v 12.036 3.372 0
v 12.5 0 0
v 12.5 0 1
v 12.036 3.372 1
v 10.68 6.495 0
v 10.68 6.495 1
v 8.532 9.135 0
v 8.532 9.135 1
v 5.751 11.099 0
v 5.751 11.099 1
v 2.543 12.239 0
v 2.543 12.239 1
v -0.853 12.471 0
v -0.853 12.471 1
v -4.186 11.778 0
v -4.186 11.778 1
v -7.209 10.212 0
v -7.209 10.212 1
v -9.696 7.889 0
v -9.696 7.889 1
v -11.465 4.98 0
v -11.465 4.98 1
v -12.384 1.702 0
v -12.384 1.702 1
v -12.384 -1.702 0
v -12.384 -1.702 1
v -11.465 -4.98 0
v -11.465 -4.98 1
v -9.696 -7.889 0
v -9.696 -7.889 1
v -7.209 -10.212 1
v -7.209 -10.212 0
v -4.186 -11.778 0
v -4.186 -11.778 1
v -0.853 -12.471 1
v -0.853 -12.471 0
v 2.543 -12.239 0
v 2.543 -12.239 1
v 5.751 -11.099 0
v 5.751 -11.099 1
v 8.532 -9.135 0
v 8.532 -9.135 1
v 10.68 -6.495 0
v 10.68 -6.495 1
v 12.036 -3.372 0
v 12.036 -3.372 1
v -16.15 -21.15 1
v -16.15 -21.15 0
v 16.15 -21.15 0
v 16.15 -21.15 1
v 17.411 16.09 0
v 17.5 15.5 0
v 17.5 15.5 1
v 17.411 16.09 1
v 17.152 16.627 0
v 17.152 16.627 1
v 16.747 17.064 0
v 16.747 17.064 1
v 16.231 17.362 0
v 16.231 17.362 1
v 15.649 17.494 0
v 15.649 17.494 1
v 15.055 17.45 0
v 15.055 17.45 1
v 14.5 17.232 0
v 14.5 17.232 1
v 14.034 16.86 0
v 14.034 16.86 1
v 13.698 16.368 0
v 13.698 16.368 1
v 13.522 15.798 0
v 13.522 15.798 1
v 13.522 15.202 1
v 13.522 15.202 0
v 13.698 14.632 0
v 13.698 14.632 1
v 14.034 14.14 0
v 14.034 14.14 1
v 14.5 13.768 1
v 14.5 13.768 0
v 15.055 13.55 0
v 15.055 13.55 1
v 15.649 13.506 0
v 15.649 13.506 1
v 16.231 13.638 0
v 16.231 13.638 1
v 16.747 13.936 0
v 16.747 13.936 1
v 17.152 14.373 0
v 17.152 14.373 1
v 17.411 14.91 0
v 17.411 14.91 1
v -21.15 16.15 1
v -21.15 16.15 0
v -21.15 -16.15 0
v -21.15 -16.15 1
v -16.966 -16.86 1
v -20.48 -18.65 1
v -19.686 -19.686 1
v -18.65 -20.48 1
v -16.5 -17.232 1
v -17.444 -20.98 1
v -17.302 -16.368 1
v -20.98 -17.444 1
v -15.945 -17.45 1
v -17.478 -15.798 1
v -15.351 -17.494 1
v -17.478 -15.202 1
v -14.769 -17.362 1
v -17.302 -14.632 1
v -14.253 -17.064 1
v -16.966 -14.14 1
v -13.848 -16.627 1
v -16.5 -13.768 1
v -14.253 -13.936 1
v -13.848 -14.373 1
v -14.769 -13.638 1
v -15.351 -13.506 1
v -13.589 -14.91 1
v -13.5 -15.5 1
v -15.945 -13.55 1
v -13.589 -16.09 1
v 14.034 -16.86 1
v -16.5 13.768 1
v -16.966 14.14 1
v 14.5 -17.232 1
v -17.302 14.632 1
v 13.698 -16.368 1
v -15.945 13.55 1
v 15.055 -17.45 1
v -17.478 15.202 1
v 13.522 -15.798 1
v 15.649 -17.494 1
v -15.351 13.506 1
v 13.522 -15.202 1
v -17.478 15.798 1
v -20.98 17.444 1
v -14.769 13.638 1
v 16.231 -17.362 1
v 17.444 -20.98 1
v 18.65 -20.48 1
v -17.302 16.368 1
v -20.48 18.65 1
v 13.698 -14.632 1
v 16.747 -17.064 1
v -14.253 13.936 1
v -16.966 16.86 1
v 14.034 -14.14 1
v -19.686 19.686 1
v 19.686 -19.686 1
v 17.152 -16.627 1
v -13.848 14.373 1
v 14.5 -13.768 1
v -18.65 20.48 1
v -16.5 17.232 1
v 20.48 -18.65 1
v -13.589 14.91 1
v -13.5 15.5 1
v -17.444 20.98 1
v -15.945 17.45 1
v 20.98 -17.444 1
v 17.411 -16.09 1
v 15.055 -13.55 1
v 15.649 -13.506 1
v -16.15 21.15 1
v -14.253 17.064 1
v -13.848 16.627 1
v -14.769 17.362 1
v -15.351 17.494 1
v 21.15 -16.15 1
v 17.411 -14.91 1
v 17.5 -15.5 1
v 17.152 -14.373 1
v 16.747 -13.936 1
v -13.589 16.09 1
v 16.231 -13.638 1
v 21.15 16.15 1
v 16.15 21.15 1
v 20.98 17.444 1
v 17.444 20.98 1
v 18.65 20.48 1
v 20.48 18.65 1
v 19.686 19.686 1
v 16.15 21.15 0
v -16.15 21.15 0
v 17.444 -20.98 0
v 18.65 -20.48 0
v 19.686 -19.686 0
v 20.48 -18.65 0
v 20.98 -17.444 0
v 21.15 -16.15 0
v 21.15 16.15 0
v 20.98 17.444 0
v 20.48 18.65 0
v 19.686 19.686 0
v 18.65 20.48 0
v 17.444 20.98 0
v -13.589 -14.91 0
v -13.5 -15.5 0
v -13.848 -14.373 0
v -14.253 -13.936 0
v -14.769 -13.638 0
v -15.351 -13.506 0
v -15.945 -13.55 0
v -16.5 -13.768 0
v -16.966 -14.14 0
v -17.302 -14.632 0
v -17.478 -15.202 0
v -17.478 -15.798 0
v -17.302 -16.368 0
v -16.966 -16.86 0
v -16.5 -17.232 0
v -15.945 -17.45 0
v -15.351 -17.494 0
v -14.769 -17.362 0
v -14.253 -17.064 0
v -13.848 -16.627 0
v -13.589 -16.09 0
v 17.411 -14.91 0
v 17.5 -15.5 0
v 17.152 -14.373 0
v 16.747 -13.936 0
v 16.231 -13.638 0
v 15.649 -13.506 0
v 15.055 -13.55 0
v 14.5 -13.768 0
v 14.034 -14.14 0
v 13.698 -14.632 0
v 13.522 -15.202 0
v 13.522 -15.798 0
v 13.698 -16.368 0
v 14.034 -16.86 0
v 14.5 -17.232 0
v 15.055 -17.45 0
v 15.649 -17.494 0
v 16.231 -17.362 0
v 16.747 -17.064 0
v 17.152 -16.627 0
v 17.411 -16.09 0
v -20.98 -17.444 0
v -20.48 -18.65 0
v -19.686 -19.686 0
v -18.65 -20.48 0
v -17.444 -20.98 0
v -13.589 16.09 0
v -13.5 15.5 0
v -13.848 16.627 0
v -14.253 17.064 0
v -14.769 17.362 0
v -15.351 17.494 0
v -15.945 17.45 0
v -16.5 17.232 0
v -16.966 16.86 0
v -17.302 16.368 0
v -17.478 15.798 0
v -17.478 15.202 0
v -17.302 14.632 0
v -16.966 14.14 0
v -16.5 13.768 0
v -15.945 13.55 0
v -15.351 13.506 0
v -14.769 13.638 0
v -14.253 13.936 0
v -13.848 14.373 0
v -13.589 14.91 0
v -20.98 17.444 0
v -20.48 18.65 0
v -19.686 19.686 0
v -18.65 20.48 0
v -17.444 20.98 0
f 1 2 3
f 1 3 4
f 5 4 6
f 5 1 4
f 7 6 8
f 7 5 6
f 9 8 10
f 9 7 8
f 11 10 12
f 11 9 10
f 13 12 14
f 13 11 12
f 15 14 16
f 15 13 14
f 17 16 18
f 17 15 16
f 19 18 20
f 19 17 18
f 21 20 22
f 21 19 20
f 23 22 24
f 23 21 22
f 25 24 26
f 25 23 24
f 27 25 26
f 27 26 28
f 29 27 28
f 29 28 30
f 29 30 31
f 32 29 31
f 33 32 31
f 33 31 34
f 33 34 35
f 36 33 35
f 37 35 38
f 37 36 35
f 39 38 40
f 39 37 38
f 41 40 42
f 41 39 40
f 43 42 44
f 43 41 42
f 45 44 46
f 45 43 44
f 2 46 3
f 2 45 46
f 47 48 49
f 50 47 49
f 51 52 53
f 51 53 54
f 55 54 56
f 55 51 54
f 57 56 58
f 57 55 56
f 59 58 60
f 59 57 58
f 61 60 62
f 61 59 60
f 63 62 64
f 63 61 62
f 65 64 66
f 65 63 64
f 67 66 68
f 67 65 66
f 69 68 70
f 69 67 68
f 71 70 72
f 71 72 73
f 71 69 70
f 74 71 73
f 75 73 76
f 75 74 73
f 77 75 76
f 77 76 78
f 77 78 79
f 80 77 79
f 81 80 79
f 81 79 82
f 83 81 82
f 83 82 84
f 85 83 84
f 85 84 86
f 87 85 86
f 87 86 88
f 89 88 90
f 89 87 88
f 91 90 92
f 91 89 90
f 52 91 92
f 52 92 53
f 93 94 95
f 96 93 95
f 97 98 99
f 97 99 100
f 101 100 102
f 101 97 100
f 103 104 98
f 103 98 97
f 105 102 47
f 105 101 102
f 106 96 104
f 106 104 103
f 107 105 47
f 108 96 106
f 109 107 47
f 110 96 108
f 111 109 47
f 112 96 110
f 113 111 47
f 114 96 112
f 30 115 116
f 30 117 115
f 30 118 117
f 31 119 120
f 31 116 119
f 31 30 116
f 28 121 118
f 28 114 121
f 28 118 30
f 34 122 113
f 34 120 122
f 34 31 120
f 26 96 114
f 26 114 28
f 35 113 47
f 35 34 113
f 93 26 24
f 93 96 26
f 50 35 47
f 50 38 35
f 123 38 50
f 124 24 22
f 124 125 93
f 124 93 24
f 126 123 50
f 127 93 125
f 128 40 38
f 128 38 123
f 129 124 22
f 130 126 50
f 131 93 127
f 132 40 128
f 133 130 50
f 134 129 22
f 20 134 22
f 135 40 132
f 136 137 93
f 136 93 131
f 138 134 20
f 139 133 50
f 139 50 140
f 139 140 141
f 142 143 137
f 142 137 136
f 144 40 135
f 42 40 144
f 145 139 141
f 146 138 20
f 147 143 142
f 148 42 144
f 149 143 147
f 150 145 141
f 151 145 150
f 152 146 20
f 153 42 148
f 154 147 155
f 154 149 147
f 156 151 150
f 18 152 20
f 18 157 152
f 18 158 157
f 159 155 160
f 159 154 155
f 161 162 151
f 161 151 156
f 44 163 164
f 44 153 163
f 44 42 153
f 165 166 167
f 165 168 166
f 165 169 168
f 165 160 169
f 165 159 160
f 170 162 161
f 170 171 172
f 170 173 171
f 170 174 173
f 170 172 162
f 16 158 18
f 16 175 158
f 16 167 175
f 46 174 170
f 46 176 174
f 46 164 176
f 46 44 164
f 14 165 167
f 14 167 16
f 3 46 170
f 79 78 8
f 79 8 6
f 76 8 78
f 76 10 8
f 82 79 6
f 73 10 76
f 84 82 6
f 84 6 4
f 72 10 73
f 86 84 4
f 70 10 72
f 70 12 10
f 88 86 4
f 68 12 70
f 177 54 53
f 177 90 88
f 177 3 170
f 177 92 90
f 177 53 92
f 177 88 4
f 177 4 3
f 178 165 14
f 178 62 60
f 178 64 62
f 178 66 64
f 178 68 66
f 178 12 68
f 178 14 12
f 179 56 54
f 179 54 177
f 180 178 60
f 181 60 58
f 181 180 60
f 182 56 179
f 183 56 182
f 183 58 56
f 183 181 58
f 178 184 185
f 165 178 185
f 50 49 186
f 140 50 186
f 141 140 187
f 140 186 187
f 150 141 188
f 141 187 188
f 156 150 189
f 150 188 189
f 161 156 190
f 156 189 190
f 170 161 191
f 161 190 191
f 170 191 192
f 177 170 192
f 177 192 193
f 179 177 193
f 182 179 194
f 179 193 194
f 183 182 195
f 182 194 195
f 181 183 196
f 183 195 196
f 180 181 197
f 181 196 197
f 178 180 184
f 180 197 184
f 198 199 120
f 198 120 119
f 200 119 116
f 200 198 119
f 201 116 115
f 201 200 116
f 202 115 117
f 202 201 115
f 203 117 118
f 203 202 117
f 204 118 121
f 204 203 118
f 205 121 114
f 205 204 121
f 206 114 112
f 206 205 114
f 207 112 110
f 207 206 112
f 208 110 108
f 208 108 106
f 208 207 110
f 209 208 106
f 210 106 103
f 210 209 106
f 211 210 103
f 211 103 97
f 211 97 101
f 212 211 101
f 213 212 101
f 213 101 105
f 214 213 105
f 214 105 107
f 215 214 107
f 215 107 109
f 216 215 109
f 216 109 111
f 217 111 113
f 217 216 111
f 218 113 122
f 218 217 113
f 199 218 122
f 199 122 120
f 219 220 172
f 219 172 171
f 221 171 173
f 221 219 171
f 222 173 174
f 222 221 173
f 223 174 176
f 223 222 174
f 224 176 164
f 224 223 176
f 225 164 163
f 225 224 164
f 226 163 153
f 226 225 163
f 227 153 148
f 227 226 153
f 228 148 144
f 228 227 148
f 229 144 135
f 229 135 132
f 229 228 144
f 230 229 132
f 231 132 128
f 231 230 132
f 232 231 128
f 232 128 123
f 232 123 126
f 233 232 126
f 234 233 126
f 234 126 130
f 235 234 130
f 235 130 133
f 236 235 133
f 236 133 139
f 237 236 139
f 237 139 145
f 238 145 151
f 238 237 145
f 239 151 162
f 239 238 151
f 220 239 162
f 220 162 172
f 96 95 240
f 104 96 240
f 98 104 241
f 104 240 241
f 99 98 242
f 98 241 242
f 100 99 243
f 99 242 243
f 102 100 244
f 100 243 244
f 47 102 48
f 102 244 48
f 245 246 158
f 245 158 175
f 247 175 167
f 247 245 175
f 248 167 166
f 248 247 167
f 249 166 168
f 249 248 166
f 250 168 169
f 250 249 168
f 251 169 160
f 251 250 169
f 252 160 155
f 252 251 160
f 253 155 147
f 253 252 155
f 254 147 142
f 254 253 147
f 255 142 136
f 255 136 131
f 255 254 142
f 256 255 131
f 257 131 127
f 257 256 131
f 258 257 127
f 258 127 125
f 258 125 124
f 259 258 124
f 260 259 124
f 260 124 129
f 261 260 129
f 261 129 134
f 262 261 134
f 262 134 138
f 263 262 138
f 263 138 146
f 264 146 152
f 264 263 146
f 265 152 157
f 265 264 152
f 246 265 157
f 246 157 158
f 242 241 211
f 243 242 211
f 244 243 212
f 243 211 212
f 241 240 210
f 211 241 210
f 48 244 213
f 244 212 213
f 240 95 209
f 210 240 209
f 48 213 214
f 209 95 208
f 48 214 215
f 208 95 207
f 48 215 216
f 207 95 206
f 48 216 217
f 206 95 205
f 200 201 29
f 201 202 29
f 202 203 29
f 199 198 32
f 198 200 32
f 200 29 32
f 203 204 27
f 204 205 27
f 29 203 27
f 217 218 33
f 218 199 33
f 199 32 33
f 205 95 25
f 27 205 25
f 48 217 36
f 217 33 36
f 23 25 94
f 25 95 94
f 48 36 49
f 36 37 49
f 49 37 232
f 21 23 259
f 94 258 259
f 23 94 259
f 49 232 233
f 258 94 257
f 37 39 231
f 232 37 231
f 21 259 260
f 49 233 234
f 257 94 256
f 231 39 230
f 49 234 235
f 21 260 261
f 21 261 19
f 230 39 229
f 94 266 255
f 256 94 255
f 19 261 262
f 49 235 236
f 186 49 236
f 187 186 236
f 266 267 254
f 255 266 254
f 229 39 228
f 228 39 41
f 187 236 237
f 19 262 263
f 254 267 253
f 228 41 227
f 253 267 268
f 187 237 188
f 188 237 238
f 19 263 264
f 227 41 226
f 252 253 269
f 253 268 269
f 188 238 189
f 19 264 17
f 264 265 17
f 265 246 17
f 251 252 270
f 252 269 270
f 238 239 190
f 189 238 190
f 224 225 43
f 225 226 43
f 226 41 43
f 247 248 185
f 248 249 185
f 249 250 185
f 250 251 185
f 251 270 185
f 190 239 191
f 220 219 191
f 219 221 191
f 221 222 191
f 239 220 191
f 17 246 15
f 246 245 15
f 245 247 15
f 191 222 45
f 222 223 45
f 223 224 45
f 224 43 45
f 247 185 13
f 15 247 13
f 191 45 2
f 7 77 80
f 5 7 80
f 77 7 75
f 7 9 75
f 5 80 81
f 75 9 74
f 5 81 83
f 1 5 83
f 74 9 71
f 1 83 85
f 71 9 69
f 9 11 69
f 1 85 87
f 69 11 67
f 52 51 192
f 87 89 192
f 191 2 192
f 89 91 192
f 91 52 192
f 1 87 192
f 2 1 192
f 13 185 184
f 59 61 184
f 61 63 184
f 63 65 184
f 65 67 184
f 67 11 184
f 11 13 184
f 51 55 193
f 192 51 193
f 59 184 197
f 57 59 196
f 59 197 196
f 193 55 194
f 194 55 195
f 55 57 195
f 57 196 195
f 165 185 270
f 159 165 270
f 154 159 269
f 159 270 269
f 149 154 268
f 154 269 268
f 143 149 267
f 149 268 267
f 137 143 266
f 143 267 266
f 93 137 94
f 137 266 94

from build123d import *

# Parameters (mm, degrees)
F0_R     = 2
F0_R_2   = 12.5
F1_DEPTH = 1


with BuildPart() as f1:
    # F0 (on Top) → F1 (new body)
    with BuildSketch(Plane.XY):
        with BuildLine():
            ThreePointArc((21.15, 16.15), (19.685534, 19.685534), (16.15, 21.15))
            Line((16.15, 21.15), (-16.15, 21.15))
            ThreePointArc((-16.15, 21.15), (-19.685534, 19.685534), (-21.15, 16.15))
            Line((-21.15, 16.15), (-21.15, -16.15))
            ThreePointArc((-21.15, -16.15), (-19.685534, -19.685534), (-16.15, -21.15))
            Line((-16.15, -21.15), (16.15, -21.15))
            ThreePointArc((16.15, -21.15), (19.685534, -19.685534), (21.15, -16.15))
            Line((21.15, -16.15), (21.15, 16.15))
        make_face()
        with Locations((-15.5, -15.5)):
            Circle(F0_R, mode=Mode.SUBTRACT)
        with Locations((15.5, -15.5)):
            Circle(F0_R, mode=Mode.SUBTRACT)
        with Locations((-15.5, 15.5)):
            Circle(F0_R, mode=Mode.SUBTRACT)
        Circle(F0_R_2, mode=Mode.SUBTRACT)
        with Locations((15.5, 15.5)):
            Circle(F0_R, mode=Mode.SUBTRACT)
    extrude(amount=F1_DEPTH)


solid = f1.part
